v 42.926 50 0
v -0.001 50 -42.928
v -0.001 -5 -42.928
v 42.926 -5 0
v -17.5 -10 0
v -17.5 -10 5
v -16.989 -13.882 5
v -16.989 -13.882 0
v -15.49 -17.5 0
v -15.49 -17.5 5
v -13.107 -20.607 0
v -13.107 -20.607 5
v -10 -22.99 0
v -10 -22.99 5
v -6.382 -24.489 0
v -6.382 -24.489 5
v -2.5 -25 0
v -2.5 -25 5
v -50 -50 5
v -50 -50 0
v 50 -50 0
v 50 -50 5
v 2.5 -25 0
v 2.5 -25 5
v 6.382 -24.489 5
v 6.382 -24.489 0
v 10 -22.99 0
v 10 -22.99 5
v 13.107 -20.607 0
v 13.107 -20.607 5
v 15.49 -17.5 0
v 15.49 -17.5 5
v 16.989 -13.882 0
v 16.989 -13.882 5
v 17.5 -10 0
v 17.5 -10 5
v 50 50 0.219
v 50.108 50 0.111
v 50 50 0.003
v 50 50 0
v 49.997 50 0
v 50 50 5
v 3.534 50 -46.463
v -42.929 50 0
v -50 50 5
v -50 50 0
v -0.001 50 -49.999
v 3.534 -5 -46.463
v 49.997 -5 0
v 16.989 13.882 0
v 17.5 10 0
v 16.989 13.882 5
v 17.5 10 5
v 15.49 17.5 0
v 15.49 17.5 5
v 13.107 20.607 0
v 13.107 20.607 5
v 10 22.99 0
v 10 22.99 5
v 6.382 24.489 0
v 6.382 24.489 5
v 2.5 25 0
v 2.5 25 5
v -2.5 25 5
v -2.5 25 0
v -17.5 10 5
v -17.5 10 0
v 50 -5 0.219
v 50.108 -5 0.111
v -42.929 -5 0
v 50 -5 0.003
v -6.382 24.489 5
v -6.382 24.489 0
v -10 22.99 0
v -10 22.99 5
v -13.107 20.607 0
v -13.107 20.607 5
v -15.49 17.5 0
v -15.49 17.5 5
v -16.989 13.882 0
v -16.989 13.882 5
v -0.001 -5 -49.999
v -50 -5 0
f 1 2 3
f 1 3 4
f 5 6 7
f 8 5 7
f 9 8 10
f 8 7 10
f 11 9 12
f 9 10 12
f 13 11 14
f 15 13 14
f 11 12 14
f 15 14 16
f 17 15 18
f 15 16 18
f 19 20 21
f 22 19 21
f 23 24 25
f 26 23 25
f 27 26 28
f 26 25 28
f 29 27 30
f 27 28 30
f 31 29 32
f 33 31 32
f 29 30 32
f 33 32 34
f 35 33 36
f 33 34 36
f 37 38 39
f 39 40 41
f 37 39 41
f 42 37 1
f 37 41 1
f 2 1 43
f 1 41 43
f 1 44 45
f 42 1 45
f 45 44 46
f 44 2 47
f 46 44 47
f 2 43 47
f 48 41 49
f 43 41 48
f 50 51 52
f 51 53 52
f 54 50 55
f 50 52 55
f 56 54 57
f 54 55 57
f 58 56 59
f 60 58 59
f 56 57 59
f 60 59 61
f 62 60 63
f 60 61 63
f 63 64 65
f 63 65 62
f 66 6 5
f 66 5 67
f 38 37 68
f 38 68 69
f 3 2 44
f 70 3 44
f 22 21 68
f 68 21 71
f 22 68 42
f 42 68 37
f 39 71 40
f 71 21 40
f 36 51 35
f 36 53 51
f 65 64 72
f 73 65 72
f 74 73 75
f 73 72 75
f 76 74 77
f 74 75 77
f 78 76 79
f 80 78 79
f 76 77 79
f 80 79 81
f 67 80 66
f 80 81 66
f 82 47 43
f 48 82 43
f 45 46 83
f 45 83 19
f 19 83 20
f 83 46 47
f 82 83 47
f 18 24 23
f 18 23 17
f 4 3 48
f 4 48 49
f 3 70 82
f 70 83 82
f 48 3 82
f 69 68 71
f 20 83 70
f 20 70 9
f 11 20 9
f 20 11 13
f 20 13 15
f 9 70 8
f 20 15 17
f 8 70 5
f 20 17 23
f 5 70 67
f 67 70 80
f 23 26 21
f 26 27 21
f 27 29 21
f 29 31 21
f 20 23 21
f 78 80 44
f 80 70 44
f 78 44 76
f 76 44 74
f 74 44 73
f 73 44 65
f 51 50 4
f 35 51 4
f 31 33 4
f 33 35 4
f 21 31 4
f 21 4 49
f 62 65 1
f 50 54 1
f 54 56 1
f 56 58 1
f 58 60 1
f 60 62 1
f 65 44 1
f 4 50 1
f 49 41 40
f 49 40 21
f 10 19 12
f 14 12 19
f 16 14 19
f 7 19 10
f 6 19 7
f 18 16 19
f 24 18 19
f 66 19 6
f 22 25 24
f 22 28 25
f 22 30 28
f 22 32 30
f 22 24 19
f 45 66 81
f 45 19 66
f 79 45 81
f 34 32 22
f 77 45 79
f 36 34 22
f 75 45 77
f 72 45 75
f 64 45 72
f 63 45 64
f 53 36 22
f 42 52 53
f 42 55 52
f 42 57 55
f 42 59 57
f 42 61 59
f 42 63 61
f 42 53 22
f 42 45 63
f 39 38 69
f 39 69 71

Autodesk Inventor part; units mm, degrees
ref_plane "YZ Plane" through (0, 0, 0) normal (1, 0, 0) x (0, 1, 0)
ref_plane "XZ Plane" through (0, 0, 0) normal (0, 1, 0) x (-1, 0, 0)
ref_plane "XY Plane" through (0, 0, 0) normal (0, 0, 1) x (1, 0, 0)
sketch "Sketch1" plane through (0, 0, 0) normal (0, 0, 1) x (1, 0, 0)
  line L0 (-50, -50) -> (50, -50)
  line L1 (50, -50) -> (50, 50)
  line L2 (50, 50) -> (-50, 50)
  line L3 (-50, 50) -> (-50, -50)
  line L4 (-50, -50) -> (50, 50) construction
  line L5 (50, -50) -> (-50, 50) construction
  point P0 (0, 0)
  dimension "d0" = 100
  dimension "d1" = 100
extrude "Extrusion1" add sketch "Sketch1" along normal blind 5
sketch "Sketch2" plane through (-50, 50, 0) normal (0, 1, 0) x (1, 0, 0)
  line L0 (0, 0) -> (100, 0) projected
  line L1 (0, 0) -> (49.9986, 49.9986)
  line L2 (49.9986, 49.9986) -> (53.5341, 46.463)
  line L3 (53.5341, 46.463) -> (3.5355, -3.5355)
  line L4 (3.5355, -3.5355) -> (0, 0)
  line L5 (0, 0) -> (70.7086, 0) construction
  line L6 (100.108, -0.1109) -> (53.5341, 46.463)
  line L7 (53.5341, 46.463) -> (49.9986, 42.9275)
  line L8 (49.9986, 42.9275) -> (96.5724, -3.6464)
  line L9 (96.5724, -3.6464) -> (100.108, -0.1109)
  point P0 (50, 0)
  point P1 (49.9986, 42.9275)
  dimension "d4" = 45
  dimension "d5" = 5
  dimension "d6" = 5
extrude "Extrusion2" add sketch "Sketch2" against normal blind 55 contours L1 L2 L3 L0 | L0 L3 L4 | L8 L3 L6 L0 | L0 L6 L9 L8
sketch "Sketch3" plane through (0, 0, 5) normal (0, 0, 1) x (1, 0, 0)
  line L0 (2.5, -25) -> (-2.5, -25)
  line L1 (-17.5, -10) -> (-17.5, 10)
  line L2 (-2.5, 25) -> (2.5, 25)
  line L3 (17.5, 10) -> (17.5, -10)
  line L4 (17.5, -25) -> (-17.5, 25) construction
  line L5 (-17.5, -25) -> (17.5, 25) construction
  arc A0 (-2.5, 25) -> (-17.5, 10) centre (-2.5, 10) ccw
  arc A1 (17.5, 10) -> (2.5, 25) centre (2.5, 10) ccw
  arc A2 (2.5, -25) -> (17.5, -10) centre (2.5, -10) ccw
  arc A3 (-17.5, -10) -> (-2.5, -25) centre (-2.5, -10) ccw
  point P0 (0, 0)
  dimension "d9" = 35
  dimension "d10" = 50
  dimension "d11" = 15
extrude "Extrusion3" cut sketch "Sketch3" against normal blind 5
properties part number "fixation_v03"
